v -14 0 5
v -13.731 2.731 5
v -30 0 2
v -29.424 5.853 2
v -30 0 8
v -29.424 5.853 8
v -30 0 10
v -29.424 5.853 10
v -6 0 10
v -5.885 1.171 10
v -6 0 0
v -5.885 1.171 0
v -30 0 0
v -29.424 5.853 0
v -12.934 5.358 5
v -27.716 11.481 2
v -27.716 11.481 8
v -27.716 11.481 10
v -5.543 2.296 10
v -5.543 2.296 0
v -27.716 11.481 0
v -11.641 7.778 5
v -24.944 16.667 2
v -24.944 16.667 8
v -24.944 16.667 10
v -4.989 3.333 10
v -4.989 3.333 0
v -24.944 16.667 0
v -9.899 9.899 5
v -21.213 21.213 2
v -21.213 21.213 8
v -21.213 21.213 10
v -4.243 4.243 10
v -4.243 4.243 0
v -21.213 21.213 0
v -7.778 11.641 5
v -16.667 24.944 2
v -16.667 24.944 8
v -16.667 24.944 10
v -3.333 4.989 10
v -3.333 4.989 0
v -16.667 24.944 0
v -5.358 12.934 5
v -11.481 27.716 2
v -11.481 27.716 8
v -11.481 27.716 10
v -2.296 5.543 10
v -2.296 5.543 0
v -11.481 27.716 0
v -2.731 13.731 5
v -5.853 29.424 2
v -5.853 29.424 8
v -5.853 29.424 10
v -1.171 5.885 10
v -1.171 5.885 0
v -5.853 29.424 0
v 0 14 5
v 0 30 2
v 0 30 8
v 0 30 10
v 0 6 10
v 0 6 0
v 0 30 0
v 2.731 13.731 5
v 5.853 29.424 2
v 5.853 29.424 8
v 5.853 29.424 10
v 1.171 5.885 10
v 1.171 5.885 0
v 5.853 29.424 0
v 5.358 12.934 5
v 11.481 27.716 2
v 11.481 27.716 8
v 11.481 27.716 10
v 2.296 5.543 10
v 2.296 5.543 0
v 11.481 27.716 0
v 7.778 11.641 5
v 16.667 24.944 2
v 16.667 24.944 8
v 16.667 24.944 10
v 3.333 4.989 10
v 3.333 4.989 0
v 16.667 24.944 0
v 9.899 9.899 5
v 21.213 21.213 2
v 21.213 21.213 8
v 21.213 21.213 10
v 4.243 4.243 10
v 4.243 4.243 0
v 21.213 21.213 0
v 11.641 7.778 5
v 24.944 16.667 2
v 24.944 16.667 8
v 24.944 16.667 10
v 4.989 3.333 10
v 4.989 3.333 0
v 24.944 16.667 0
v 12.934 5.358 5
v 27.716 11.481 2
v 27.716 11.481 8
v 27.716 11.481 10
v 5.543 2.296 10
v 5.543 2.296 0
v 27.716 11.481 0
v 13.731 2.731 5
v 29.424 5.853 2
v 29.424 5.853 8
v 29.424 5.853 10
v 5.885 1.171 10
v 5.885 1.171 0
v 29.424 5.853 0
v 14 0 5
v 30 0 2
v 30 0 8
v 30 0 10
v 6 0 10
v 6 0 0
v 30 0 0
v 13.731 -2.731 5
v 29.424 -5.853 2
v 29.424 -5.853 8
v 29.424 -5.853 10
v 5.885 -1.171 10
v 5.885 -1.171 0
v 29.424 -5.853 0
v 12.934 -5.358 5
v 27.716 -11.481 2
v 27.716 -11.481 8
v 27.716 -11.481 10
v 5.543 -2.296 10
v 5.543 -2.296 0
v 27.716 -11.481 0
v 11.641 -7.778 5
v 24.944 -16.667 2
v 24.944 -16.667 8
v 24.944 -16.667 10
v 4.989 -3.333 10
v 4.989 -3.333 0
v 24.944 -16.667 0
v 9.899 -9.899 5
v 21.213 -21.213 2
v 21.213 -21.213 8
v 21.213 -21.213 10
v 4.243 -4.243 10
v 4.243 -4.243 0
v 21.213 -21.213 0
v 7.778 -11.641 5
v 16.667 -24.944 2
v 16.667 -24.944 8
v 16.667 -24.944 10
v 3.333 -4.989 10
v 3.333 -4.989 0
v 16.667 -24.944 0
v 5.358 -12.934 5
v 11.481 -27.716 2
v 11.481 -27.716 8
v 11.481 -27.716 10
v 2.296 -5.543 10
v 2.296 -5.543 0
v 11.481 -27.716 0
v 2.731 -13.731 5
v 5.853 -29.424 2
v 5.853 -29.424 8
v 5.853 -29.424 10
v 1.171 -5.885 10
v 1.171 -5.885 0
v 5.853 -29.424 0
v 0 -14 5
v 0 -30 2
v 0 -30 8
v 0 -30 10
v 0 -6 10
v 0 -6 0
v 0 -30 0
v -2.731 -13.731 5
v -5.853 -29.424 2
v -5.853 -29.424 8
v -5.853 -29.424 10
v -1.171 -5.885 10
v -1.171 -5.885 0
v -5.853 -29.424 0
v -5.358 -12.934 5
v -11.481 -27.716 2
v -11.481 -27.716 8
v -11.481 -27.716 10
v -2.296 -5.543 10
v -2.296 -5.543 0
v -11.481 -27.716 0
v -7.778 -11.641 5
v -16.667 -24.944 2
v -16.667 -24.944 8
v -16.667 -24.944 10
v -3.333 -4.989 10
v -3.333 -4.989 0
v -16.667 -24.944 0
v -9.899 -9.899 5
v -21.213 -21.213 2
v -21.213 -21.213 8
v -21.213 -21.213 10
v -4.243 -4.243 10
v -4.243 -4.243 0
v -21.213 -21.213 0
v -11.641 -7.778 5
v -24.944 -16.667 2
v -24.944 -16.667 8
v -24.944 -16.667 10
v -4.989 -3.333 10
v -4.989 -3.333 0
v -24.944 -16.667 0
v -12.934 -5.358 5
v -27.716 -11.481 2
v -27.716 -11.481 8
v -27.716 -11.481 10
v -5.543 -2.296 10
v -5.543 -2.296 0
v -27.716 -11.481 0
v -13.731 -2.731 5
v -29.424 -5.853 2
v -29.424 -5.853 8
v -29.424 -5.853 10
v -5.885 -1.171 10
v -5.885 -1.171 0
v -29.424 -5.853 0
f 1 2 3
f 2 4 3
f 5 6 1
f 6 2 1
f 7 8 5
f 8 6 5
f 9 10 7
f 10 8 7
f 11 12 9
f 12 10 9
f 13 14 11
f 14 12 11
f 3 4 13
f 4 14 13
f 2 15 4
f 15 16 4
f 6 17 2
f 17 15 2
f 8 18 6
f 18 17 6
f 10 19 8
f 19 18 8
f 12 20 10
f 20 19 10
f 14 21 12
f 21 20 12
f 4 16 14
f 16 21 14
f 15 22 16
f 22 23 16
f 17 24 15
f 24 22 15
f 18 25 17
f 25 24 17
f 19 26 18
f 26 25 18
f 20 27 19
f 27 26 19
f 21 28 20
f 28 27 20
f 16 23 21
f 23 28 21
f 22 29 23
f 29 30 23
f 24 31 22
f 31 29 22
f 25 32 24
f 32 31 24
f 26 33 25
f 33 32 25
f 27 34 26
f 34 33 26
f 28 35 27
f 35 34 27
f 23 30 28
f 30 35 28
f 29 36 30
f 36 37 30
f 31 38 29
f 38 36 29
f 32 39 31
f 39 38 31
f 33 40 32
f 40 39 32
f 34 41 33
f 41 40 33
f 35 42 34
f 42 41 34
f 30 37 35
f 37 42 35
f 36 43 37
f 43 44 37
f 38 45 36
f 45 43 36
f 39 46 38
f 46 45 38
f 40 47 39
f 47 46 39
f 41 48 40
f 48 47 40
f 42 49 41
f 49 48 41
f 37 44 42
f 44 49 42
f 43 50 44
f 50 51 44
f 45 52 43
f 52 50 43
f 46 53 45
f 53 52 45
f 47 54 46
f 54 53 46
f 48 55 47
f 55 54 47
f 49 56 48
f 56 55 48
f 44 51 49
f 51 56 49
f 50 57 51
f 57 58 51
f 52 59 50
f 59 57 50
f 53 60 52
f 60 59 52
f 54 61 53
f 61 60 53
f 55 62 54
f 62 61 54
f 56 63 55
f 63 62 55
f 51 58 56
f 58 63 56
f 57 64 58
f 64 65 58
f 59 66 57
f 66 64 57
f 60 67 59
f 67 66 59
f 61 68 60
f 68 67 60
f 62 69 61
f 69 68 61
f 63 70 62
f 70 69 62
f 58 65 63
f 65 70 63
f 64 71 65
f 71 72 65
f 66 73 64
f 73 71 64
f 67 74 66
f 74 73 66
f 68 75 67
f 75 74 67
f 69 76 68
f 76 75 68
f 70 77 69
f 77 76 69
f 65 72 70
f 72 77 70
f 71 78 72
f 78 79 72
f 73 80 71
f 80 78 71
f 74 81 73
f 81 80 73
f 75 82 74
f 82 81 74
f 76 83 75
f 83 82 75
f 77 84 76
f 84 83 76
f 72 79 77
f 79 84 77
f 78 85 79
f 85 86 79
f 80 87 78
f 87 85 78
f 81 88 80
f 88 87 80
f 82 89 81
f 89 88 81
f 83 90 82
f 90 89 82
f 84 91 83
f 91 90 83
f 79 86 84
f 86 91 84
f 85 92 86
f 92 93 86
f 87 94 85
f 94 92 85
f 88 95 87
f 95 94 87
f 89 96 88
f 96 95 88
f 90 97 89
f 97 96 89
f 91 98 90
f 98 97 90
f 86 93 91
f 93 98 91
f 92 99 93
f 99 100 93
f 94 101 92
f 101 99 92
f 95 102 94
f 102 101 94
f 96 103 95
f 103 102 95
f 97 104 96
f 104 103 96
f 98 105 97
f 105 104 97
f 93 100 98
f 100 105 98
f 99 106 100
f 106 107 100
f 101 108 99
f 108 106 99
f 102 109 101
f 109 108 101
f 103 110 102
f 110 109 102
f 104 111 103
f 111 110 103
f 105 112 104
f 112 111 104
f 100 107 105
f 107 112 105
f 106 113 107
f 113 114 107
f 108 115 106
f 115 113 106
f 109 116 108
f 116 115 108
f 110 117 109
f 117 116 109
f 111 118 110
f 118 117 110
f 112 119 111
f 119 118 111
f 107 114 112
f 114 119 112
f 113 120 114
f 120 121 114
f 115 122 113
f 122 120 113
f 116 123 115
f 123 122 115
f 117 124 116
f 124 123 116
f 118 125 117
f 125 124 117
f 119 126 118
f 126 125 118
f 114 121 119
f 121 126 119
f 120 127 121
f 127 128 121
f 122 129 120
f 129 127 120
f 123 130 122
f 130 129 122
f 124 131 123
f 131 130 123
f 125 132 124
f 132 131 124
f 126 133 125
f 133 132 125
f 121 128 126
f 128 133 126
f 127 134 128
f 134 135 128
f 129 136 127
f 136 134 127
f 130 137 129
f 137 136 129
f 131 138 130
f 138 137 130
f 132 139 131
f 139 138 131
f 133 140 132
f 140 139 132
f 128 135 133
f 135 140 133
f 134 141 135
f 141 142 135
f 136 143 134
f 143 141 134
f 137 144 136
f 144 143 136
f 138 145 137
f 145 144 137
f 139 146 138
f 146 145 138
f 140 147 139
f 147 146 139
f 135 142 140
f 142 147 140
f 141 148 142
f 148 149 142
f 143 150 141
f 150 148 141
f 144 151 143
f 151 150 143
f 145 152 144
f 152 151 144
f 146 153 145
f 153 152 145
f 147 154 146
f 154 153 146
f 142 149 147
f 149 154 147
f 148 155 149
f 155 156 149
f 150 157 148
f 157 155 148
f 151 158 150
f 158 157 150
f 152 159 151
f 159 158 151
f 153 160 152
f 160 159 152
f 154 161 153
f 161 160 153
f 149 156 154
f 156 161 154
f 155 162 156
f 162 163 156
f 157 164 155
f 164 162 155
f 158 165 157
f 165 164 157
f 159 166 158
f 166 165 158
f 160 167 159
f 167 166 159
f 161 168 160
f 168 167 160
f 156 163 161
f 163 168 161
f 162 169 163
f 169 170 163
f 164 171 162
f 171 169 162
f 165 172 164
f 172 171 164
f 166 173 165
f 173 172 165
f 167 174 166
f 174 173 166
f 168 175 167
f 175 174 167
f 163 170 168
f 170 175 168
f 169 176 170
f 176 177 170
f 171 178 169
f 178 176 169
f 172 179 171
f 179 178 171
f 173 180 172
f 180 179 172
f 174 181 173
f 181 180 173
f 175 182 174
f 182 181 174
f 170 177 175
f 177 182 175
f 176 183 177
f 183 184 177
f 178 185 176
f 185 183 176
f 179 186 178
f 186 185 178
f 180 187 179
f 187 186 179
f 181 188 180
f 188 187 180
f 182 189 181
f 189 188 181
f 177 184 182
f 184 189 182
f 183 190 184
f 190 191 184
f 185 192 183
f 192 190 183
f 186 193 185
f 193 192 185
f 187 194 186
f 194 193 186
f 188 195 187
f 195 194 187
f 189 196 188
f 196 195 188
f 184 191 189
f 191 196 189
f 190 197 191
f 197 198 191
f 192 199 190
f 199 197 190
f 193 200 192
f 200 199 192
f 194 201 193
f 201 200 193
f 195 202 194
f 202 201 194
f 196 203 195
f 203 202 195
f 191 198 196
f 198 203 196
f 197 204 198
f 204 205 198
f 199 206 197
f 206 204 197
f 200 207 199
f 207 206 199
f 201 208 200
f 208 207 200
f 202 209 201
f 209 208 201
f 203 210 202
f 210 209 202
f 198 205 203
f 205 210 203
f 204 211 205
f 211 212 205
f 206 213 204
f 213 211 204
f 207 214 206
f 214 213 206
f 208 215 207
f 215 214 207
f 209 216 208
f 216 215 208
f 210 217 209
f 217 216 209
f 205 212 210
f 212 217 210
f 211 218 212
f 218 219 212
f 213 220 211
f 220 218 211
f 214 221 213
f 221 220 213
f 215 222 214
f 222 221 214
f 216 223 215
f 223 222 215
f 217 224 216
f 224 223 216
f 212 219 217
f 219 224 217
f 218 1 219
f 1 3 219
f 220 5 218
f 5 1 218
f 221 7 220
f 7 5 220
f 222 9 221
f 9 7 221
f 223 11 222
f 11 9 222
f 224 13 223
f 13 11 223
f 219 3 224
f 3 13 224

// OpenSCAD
$fn = 32;

// ----------------------------------------------------------------------
// Revolved part: V-groove pulley R30
// ----------------------------------------------------------------------

// --- parameters (mm) ---
bore_r = 6;               // bore radius
rim_r = 30;               // rim radius
rim_t = 10;               // rim width
groove_r = 14;            // groove root radius
groove_w = 3;             // groove half width
revolve_angle = 360;      // revolve sweep, degrees

bore_d = 2 * bore_r;
rim_d = 2 * rim_r;
groove_d = 2 * groove_r;

profile = [[6, 0], [30, 0], [30, 2], [14, 5], [30, 8], [30, 10], [6, 10]];  // primary outline, 7 points, counter clockwise

// --- the one profile operation ---
rotate_extrude(angle = revolve_angle) polygon(points = profile);
